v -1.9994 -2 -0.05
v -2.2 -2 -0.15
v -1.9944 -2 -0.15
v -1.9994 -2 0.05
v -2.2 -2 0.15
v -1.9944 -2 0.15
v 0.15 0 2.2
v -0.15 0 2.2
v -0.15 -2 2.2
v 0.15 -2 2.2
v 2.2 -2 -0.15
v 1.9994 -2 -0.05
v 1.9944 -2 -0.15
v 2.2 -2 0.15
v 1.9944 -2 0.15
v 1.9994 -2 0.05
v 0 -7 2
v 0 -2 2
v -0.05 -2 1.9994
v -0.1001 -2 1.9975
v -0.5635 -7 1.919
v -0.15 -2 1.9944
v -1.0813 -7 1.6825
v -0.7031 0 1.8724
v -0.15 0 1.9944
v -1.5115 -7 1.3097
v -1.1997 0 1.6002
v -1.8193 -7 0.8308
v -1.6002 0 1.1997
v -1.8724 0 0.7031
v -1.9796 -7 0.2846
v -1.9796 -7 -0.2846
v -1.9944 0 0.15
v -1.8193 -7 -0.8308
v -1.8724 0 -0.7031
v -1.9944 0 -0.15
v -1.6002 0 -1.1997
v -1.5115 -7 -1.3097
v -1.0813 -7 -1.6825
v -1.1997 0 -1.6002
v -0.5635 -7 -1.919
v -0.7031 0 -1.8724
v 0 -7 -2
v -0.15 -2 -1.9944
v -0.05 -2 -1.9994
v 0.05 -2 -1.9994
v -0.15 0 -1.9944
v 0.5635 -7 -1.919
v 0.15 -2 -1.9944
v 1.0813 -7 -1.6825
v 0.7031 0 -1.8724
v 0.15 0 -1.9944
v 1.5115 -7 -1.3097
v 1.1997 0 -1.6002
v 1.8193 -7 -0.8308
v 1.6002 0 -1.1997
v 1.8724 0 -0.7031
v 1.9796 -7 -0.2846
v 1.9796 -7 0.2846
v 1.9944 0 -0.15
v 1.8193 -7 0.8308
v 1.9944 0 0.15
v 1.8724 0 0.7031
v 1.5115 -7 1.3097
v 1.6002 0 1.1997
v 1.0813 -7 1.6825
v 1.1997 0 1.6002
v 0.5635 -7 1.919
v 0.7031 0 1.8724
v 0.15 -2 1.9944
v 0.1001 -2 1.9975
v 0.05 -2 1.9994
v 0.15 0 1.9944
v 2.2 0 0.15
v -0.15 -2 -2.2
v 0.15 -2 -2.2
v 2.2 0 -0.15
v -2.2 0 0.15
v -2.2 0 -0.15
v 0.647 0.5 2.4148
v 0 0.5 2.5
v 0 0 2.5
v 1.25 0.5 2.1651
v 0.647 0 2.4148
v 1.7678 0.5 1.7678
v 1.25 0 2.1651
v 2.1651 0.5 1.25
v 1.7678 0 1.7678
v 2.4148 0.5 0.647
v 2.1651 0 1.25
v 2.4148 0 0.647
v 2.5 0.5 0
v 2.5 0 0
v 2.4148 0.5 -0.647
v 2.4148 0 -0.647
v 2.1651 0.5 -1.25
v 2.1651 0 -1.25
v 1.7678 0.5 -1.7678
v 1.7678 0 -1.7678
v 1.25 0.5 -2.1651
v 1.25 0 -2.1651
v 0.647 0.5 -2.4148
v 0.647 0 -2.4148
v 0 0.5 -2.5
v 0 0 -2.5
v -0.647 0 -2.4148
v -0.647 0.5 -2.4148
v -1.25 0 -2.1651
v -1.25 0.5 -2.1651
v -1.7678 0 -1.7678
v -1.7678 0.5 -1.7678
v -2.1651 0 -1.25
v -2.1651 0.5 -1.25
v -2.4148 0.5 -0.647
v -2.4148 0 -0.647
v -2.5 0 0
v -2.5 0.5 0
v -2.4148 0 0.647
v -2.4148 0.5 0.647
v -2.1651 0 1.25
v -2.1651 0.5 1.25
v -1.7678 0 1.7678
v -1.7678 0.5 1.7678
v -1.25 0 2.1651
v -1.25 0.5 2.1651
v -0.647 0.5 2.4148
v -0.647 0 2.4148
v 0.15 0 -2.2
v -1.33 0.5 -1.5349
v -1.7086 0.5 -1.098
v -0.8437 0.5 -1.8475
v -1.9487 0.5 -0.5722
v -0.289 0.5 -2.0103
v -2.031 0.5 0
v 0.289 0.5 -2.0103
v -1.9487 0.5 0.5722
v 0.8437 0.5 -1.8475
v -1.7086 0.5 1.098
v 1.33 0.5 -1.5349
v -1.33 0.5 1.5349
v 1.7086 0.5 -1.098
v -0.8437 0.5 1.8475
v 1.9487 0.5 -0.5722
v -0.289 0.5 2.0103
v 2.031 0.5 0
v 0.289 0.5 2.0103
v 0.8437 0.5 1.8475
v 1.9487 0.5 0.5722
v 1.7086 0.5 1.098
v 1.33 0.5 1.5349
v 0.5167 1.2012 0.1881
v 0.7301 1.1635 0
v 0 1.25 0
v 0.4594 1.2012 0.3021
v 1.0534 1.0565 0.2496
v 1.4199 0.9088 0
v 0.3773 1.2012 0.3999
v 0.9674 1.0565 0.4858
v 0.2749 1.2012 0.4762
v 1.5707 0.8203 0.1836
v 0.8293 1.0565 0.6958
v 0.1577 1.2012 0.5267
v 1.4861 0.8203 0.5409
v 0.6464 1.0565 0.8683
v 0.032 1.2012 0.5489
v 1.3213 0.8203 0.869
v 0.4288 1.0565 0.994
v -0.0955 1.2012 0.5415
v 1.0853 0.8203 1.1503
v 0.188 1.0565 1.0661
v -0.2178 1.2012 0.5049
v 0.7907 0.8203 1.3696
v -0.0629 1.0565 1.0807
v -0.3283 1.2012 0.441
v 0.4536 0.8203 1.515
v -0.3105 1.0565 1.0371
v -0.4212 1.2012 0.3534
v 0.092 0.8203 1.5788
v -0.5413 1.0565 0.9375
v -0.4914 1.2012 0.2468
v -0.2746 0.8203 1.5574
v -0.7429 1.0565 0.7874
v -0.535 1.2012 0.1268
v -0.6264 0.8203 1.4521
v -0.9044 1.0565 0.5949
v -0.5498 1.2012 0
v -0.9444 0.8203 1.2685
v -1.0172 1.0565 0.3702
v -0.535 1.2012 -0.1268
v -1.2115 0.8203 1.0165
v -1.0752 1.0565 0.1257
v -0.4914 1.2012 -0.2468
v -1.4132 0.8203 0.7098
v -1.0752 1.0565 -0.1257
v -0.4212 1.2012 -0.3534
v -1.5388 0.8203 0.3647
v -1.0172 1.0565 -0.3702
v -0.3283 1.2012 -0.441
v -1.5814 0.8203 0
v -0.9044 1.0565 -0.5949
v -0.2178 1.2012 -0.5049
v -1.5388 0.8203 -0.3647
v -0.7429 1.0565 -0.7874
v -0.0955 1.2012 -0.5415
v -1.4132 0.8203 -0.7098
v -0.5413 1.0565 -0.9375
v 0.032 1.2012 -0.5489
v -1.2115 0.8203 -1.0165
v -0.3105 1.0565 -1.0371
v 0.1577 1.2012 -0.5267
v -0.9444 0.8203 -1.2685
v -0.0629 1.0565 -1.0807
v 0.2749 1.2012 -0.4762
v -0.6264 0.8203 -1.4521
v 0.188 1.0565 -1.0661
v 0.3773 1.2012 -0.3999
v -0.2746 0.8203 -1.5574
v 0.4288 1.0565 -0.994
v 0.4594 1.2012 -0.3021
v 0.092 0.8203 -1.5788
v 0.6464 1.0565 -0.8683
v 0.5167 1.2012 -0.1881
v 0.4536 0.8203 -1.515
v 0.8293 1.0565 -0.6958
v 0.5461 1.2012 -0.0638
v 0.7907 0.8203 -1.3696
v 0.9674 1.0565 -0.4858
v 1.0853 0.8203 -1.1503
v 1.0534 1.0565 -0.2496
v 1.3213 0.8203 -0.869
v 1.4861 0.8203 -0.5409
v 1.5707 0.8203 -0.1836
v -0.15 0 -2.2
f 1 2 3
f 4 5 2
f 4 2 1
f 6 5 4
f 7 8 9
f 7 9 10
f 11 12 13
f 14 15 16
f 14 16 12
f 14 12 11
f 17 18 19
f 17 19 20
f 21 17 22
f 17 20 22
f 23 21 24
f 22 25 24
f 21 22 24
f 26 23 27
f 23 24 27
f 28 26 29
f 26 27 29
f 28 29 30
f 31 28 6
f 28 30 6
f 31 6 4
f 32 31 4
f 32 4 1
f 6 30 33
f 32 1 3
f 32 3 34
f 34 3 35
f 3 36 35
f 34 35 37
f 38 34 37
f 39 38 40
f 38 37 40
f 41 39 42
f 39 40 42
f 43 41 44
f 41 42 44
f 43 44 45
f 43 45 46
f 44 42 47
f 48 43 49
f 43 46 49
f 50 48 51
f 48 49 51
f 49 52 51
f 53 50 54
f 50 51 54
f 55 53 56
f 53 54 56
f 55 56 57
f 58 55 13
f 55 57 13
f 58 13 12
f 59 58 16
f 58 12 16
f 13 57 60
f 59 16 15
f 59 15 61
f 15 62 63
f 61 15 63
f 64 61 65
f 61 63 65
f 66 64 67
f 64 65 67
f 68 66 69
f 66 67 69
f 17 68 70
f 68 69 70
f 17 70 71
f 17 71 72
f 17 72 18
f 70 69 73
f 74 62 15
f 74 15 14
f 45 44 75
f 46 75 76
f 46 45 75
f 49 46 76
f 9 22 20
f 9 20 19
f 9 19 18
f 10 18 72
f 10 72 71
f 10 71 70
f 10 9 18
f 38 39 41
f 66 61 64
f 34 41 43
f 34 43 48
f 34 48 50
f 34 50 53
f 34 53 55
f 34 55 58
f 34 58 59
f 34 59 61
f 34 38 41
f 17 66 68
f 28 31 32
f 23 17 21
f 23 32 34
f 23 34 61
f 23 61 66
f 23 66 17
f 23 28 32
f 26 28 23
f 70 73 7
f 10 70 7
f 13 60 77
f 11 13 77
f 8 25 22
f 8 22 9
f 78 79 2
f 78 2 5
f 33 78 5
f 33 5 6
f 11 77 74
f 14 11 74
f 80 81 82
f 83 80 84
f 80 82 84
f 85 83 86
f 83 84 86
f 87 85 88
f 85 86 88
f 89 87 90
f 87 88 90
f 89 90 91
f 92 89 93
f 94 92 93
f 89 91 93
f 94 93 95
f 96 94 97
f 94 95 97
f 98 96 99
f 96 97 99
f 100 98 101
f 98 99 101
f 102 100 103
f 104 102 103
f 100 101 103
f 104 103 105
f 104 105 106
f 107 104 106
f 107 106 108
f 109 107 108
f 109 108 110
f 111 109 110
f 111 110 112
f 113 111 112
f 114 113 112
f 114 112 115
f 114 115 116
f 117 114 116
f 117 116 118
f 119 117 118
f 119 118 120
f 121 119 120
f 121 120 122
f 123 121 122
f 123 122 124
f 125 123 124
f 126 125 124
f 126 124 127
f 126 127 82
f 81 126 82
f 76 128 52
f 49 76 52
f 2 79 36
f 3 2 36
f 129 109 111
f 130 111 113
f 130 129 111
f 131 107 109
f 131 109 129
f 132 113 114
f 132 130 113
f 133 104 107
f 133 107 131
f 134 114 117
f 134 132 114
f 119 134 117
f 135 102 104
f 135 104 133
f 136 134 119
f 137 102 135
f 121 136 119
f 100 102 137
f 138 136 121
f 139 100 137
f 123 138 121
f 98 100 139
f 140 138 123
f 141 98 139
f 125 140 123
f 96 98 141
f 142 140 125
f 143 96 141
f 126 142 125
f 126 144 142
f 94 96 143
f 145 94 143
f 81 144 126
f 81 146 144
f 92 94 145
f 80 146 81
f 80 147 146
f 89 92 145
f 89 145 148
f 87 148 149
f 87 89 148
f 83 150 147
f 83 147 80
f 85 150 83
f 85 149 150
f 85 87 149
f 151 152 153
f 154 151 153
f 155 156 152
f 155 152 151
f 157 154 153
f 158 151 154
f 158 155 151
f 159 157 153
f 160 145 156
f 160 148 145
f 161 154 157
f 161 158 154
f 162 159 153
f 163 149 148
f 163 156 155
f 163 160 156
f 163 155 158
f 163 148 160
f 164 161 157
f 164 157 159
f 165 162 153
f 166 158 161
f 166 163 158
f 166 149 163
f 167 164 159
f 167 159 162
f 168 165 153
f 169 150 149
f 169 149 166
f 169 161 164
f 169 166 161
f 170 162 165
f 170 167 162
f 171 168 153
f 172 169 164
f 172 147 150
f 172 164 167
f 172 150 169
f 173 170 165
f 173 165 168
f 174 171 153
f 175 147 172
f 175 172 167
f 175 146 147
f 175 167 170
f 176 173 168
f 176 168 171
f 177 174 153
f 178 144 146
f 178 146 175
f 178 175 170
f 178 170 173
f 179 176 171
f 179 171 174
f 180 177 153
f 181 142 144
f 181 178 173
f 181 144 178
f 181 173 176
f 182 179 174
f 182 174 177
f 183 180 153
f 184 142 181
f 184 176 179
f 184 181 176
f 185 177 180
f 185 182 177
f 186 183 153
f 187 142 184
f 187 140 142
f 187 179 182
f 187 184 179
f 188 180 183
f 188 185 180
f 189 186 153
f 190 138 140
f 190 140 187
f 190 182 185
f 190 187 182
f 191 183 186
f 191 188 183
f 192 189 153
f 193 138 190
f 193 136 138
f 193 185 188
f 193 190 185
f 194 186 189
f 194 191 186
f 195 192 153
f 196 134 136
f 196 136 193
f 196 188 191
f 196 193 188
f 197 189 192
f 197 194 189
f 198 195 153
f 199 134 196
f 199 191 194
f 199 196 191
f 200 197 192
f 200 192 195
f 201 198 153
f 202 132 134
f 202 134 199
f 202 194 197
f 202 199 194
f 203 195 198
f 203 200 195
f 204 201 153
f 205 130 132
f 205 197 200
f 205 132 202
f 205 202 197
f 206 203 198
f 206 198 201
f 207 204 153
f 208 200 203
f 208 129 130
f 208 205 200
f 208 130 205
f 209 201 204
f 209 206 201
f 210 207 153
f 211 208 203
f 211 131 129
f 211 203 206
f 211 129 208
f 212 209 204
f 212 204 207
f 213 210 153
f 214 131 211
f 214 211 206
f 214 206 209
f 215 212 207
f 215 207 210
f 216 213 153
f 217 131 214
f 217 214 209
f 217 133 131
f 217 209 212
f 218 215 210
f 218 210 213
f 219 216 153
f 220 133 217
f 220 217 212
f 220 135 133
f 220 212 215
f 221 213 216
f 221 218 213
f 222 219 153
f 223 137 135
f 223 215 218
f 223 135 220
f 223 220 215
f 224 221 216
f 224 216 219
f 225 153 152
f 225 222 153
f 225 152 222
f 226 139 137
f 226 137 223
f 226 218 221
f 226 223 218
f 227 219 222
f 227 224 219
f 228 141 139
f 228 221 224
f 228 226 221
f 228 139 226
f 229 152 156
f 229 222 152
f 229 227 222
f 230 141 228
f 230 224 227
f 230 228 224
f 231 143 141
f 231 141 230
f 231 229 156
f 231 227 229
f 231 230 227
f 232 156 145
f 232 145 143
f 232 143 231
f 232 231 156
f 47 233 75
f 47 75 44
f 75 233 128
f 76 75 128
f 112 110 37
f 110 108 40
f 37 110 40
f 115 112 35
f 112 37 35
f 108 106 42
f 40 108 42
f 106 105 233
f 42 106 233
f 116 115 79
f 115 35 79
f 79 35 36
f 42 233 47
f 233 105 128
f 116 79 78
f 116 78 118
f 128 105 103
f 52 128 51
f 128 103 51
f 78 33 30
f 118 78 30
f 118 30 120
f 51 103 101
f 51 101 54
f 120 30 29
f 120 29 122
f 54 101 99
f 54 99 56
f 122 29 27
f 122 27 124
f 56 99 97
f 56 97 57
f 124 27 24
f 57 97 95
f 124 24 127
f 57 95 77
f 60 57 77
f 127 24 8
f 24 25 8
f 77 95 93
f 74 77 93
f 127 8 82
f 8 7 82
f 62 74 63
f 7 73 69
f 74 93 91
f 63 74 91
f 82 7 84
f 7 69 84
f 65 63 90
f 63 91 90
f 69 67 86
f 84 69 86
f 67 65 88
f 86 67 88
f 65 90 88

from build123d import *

# Parameters (mm, degrees)
SKETCH_1_R      = 2.5
EXTRUDE_1_DEPTH = 0.5
SKETCH_4_R      = 2
EXTRUDE_2_DEPTH = 7
SKETCH_5_W      = 0.3
SKETCH_5_H      = 0.29255476
SKETCH_5_W_2    = 0.29255476
SKETCH_5_H_2    = 0.3
EXTRUDE_3_DEPTH = 2


with BuildPart() as part:
    # 草图1 → 凸台-拉伸1 (new body)
    with BuildSketch(Plane(origin=(0, 0, 0), x_dir=(1, 0, 0), z_dir=(0, 1, 0))):
        with Locations(Location((0, 0, 0), (0, 0, 270))):
            Circle(SKETCH_1_R)
    extrude(amount=EXTRUDE_1_DEPTH)

    # 草图2 → 旋转4 (revolve)
    with BuildSketch(Plane.XY):
        with BuildLine():
            Line((2.5, 0), (0, 0))
            Line((0, 0), (0, 1.25))
            ThreePointArc((0, 1.25), (1.397542486, 0.920084972), (2.5, 0))
        make_face()
    revolve(axis=Axis((0, 3.671150215, 0), (0, -1, 0)))

    # 草图4 → 凸台-拉伸2 (add)
    with BuildSketch(Plane.XZ):
        with Locations(Location((0, 0, 0), (0, 0, 90))):
            Circle(SKETCH_4_R)
    extrude(amount=EXTRUDE_2_DEPTH)

    # 草图5 → 凸台-拉伸3 (add)
    with BuildSketch(Plane.XZ):
        with Locations((0, 2.05372262)):
            Rectangle(SKETCH_5_W, SKETCH_5_H)
        with Locations((-2.05372262, 0)):
            Rectangle(SKETCH_5_W_2, SKETCH_5_H_2)
        with Locations((2.05372262, 0)):
            Rectangle(SKETCH_5_W_2, SKETCH_5_H_2)
        with Locations((0, -2.05372262)):
            Rectangle(SKETCH_5_W, SKETCH_5_H)
    extrude(amount=EXTRUDE_3_DEPTH)


solid = part.part
